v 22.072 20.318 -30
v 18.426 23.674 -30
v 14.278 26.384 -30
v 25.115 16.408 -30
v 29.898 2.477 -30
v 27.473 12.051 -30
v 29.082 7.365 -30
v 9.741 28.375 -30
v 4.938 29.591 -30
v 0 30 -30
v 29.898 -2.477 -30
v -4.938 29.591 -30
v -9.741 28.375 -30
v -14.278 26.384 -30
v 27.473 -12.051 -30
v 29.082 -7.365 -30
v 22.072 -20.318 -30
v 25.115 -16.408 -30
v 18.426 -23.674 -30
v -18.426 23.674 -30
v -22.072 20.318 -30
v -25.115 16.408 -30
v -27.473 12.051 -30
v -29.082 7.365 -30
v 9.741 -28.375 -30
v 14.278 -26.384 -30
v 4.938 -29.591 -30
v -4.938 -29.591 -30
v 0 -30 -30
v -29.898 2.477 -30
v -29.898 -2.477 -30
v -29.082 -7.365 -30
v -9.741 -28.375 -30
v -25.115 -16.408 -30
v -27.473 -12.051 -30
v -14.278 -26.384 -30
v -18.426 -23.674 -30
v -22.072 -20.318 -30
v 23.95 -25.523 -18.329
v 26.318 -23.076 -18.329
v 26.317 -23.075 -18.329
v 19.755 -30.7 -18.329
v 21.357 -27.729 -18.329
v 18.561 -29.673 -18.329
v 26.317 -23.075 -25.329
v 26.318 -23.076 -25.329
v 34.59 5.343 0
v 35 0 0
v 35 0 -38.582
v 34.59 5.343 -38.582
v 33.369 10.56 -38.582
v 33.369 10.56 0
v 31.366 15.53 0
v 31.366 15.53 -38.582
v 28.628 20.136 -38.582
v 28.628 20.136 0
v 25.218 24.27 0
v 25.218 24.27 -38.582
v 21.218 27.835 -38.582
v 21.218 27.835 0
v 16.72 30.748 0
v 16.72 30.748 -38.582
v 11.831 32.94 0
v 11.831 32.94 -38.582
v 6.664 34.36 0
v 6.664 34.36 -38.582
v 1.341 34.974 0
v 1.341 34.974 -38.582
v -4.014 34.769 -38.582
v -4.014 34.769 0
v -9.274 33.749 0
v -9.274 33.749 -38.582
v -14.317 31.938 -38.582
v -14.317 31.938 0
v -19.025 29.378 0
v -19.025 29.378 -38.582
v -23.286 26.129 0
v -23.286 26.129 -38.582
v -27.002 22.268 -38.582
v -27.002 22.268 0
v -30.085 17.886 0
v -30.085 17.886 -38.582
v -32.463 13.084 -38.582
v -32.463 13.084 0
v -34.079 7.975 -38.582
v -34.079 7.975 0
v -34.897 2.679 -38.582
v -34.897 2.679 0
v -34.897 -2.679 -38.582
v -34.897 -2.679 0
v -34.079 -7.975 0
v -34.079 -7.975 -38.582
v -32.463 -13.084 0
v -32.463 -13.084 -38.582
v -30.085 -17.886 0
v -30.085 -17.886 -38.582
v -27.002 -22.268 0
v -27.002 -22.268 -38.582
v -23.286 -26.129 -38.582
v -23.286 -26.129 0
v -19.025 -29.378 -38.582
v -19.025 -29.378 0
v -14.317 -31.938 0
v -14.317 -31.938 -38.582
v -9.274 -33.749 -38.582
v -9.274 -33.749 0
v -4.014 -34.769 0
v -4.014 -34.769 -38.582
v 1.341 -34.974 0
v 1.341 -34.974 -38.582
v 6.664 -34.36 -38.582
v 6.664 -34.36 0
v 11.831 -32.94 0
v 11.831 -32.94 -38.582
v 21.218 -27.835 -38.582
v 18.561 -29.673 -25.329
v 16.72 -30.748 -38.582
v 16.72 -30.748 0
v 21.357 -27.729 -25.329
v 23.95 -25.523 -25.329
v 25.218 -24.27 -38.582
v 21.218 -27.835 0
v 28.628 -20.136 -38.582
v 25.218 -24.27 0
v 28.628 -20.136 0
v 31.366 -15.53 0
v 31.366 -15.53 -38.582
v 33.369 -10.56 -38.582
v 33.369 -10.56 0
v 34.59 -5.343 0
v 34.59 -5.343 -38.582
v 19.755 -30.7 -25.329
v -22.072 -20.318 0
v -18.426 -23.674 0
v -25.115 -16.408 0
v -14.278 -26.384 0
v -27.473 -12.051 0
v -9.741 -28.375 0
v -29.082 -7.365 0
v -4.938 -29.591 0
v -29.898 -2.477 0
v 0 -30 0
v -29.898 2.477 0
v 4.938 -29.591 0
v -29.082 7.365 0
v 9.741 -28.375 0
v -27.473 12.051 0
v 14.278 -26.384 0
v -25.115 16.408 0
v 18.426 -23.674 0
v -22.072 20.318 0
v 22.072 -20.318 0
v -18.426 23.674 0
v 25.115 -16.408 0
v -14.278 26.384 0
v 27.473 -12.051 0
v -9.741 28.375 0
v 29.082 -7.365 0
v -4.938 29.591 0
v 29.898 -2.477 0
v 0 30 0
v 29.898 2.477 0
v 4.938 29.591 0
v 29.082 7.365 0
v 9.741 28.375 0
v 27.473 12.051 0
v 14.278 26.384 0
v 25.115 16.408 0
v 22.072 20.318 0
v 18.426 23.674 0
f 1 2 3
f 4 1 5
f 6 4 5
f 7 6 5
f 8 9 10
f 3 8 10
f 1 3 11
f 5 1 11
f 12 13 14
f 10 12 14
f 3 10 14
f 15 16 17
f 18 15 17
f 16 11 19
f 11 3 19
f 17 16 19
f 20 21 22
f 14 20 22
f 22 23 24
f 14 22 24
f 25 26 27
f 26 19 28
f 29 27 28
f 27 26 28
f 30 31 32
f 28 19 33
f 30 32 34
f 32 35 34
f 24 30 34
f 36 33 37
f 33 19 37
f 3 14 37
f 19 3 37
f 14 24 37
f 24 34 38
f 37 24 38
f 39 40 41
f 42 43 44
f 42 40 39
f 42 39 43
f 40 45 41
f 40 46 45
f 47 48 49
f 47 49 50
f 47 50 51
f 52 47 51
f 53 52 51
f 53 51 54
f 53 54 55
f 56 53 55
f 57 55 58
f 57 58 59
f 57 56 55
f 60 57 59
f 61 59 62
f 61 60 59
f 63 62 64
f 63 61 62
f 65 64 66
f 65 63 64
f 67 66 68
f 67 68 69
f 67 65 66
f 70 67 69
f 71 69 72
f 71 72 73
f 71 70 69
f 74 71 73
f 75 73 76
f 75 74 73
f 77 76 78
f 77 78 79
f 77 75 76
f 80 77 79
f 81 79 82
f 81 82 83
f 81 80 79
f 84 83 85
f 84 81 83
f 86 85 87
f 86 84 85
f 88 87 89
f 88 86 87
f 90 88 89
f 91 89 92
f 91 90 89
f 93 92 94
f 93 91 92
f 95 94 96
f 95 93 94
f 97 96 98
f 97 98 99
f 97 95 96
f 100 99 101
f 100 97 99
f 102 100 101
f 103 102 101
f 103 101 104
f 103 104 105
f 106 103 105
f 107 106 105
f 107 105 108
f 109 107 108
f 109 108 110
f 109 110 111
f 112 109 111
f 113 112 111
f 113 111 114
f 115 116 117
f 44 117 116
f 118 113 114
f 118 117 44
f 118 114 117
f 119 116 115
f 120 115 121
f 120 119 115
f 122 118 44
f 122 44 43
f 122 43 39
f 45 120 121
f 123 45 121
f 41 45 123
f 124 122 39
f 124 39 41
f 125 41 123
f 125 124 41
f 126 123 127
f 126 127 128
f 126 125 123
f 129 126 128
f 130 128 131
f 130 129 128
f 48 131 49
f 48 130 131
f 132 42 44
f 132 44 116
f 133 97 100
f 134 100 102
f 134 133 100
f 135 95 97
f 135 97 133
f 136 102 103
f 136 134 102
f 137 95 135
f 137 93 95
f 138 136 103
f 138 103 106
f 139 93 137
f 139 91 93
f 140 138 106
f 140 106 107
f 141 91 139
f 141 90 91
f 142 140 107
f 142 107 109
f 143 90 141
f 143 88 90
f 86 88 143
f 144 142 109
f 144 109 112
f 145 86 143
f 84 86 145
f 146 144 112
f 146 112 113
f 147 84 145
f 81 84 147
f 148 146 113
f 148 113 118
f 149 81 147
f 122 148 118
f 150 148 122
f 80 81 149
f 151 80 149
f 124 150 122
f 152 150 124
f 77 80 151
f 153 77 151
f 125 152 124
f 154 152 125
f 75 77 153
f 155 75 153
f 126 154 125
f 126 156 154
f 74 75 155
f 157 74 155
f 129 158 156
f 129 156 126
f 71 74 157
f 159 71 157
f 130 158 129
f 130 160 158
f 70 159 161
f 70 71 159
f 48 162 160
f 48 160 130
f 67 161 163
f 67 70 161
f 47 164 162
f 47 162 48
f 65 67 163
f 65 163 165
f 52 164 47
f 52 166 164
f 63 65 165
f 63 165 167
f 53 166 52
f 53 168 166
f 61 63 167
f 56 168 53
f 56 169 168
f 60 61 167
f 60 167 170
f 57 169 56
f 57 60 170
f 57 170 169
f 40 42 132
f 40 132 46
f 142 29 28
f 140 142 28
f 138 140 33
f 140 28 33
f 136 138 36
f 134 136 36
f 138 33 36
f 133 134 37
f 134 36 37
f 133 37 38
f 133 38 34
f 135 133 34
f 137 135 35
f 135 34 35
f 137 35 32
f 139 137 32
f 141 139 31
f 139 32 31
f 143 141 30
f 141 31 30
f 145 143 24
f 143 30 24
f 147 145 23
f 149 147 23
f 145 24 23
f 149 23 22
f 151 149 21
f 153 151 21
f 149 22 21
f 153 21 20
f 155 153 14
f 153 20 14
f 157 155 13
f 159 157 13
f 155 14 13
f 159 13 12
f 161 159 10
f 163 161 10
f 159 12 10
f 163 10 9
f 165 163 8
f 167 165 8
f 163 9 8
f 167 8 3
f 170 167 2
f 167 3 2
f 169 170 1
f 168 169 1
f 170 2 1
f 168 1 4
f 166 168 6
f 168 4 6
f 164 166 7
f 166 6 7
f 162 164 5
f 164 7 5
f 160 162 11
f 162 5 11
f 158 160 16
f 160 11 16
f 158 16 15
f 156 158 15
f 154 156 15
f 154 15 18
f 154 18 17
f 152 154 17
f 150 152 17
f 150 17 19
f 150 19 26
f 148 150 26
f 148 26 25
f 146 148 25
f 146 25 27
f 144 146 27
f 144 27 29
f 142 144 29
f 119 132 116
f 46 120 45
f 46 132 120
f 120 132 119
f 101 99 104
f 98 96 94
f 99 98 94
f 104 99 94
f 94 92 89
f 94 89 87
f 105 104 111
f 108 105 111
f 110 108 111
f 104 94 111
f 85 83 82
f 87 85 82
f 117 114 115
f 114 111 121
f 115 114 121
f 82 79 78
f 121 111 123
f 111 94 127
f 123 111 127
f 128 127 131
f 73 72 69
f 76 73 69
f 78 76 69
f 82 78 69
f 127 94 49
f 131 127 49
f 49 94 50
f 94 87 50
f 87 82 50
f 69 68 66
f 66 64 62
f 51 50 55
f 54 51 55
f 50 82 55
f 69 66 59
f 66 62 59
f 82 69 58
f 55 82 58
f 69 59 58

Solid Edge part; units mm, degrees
sketch "Sketch1" plane through (0, 0, 0) normal (0, 0, 1) x (1, 0, 0)
  circle A0 centre (0, 0) radius 35
extrude "Protrusion1" add sketch "Sketch1" against normal blind 38.5823
hole "Hole_3" at (0, 0, 0) direction (0, 0, -1) diameter 60 depth 30
sketch "Sketch2" plane through (26.5265, -22.833, -19.2912) normal (0.7579, -0.6524, 0) x (0, 0, 1)
  line L0 (-6.0379, 0.3201) -> (0.9621, 0.3201)
  line L1 (0.9621, 0.3201) -> (0.9621, 10.3801)
  line L2 (0.9621, 10.3801) -> (-6.0379, 10.3801)
  line L3 (-6.0379, 10.3801) -> (-6.0379, 0.3201)
  dimension "D1" = 7
  dimension "D2" = 10.06
extrude "Protrusion2" add sketch "Sketch2" against normal blind 1.6301
properties material "Galvanized steel"
